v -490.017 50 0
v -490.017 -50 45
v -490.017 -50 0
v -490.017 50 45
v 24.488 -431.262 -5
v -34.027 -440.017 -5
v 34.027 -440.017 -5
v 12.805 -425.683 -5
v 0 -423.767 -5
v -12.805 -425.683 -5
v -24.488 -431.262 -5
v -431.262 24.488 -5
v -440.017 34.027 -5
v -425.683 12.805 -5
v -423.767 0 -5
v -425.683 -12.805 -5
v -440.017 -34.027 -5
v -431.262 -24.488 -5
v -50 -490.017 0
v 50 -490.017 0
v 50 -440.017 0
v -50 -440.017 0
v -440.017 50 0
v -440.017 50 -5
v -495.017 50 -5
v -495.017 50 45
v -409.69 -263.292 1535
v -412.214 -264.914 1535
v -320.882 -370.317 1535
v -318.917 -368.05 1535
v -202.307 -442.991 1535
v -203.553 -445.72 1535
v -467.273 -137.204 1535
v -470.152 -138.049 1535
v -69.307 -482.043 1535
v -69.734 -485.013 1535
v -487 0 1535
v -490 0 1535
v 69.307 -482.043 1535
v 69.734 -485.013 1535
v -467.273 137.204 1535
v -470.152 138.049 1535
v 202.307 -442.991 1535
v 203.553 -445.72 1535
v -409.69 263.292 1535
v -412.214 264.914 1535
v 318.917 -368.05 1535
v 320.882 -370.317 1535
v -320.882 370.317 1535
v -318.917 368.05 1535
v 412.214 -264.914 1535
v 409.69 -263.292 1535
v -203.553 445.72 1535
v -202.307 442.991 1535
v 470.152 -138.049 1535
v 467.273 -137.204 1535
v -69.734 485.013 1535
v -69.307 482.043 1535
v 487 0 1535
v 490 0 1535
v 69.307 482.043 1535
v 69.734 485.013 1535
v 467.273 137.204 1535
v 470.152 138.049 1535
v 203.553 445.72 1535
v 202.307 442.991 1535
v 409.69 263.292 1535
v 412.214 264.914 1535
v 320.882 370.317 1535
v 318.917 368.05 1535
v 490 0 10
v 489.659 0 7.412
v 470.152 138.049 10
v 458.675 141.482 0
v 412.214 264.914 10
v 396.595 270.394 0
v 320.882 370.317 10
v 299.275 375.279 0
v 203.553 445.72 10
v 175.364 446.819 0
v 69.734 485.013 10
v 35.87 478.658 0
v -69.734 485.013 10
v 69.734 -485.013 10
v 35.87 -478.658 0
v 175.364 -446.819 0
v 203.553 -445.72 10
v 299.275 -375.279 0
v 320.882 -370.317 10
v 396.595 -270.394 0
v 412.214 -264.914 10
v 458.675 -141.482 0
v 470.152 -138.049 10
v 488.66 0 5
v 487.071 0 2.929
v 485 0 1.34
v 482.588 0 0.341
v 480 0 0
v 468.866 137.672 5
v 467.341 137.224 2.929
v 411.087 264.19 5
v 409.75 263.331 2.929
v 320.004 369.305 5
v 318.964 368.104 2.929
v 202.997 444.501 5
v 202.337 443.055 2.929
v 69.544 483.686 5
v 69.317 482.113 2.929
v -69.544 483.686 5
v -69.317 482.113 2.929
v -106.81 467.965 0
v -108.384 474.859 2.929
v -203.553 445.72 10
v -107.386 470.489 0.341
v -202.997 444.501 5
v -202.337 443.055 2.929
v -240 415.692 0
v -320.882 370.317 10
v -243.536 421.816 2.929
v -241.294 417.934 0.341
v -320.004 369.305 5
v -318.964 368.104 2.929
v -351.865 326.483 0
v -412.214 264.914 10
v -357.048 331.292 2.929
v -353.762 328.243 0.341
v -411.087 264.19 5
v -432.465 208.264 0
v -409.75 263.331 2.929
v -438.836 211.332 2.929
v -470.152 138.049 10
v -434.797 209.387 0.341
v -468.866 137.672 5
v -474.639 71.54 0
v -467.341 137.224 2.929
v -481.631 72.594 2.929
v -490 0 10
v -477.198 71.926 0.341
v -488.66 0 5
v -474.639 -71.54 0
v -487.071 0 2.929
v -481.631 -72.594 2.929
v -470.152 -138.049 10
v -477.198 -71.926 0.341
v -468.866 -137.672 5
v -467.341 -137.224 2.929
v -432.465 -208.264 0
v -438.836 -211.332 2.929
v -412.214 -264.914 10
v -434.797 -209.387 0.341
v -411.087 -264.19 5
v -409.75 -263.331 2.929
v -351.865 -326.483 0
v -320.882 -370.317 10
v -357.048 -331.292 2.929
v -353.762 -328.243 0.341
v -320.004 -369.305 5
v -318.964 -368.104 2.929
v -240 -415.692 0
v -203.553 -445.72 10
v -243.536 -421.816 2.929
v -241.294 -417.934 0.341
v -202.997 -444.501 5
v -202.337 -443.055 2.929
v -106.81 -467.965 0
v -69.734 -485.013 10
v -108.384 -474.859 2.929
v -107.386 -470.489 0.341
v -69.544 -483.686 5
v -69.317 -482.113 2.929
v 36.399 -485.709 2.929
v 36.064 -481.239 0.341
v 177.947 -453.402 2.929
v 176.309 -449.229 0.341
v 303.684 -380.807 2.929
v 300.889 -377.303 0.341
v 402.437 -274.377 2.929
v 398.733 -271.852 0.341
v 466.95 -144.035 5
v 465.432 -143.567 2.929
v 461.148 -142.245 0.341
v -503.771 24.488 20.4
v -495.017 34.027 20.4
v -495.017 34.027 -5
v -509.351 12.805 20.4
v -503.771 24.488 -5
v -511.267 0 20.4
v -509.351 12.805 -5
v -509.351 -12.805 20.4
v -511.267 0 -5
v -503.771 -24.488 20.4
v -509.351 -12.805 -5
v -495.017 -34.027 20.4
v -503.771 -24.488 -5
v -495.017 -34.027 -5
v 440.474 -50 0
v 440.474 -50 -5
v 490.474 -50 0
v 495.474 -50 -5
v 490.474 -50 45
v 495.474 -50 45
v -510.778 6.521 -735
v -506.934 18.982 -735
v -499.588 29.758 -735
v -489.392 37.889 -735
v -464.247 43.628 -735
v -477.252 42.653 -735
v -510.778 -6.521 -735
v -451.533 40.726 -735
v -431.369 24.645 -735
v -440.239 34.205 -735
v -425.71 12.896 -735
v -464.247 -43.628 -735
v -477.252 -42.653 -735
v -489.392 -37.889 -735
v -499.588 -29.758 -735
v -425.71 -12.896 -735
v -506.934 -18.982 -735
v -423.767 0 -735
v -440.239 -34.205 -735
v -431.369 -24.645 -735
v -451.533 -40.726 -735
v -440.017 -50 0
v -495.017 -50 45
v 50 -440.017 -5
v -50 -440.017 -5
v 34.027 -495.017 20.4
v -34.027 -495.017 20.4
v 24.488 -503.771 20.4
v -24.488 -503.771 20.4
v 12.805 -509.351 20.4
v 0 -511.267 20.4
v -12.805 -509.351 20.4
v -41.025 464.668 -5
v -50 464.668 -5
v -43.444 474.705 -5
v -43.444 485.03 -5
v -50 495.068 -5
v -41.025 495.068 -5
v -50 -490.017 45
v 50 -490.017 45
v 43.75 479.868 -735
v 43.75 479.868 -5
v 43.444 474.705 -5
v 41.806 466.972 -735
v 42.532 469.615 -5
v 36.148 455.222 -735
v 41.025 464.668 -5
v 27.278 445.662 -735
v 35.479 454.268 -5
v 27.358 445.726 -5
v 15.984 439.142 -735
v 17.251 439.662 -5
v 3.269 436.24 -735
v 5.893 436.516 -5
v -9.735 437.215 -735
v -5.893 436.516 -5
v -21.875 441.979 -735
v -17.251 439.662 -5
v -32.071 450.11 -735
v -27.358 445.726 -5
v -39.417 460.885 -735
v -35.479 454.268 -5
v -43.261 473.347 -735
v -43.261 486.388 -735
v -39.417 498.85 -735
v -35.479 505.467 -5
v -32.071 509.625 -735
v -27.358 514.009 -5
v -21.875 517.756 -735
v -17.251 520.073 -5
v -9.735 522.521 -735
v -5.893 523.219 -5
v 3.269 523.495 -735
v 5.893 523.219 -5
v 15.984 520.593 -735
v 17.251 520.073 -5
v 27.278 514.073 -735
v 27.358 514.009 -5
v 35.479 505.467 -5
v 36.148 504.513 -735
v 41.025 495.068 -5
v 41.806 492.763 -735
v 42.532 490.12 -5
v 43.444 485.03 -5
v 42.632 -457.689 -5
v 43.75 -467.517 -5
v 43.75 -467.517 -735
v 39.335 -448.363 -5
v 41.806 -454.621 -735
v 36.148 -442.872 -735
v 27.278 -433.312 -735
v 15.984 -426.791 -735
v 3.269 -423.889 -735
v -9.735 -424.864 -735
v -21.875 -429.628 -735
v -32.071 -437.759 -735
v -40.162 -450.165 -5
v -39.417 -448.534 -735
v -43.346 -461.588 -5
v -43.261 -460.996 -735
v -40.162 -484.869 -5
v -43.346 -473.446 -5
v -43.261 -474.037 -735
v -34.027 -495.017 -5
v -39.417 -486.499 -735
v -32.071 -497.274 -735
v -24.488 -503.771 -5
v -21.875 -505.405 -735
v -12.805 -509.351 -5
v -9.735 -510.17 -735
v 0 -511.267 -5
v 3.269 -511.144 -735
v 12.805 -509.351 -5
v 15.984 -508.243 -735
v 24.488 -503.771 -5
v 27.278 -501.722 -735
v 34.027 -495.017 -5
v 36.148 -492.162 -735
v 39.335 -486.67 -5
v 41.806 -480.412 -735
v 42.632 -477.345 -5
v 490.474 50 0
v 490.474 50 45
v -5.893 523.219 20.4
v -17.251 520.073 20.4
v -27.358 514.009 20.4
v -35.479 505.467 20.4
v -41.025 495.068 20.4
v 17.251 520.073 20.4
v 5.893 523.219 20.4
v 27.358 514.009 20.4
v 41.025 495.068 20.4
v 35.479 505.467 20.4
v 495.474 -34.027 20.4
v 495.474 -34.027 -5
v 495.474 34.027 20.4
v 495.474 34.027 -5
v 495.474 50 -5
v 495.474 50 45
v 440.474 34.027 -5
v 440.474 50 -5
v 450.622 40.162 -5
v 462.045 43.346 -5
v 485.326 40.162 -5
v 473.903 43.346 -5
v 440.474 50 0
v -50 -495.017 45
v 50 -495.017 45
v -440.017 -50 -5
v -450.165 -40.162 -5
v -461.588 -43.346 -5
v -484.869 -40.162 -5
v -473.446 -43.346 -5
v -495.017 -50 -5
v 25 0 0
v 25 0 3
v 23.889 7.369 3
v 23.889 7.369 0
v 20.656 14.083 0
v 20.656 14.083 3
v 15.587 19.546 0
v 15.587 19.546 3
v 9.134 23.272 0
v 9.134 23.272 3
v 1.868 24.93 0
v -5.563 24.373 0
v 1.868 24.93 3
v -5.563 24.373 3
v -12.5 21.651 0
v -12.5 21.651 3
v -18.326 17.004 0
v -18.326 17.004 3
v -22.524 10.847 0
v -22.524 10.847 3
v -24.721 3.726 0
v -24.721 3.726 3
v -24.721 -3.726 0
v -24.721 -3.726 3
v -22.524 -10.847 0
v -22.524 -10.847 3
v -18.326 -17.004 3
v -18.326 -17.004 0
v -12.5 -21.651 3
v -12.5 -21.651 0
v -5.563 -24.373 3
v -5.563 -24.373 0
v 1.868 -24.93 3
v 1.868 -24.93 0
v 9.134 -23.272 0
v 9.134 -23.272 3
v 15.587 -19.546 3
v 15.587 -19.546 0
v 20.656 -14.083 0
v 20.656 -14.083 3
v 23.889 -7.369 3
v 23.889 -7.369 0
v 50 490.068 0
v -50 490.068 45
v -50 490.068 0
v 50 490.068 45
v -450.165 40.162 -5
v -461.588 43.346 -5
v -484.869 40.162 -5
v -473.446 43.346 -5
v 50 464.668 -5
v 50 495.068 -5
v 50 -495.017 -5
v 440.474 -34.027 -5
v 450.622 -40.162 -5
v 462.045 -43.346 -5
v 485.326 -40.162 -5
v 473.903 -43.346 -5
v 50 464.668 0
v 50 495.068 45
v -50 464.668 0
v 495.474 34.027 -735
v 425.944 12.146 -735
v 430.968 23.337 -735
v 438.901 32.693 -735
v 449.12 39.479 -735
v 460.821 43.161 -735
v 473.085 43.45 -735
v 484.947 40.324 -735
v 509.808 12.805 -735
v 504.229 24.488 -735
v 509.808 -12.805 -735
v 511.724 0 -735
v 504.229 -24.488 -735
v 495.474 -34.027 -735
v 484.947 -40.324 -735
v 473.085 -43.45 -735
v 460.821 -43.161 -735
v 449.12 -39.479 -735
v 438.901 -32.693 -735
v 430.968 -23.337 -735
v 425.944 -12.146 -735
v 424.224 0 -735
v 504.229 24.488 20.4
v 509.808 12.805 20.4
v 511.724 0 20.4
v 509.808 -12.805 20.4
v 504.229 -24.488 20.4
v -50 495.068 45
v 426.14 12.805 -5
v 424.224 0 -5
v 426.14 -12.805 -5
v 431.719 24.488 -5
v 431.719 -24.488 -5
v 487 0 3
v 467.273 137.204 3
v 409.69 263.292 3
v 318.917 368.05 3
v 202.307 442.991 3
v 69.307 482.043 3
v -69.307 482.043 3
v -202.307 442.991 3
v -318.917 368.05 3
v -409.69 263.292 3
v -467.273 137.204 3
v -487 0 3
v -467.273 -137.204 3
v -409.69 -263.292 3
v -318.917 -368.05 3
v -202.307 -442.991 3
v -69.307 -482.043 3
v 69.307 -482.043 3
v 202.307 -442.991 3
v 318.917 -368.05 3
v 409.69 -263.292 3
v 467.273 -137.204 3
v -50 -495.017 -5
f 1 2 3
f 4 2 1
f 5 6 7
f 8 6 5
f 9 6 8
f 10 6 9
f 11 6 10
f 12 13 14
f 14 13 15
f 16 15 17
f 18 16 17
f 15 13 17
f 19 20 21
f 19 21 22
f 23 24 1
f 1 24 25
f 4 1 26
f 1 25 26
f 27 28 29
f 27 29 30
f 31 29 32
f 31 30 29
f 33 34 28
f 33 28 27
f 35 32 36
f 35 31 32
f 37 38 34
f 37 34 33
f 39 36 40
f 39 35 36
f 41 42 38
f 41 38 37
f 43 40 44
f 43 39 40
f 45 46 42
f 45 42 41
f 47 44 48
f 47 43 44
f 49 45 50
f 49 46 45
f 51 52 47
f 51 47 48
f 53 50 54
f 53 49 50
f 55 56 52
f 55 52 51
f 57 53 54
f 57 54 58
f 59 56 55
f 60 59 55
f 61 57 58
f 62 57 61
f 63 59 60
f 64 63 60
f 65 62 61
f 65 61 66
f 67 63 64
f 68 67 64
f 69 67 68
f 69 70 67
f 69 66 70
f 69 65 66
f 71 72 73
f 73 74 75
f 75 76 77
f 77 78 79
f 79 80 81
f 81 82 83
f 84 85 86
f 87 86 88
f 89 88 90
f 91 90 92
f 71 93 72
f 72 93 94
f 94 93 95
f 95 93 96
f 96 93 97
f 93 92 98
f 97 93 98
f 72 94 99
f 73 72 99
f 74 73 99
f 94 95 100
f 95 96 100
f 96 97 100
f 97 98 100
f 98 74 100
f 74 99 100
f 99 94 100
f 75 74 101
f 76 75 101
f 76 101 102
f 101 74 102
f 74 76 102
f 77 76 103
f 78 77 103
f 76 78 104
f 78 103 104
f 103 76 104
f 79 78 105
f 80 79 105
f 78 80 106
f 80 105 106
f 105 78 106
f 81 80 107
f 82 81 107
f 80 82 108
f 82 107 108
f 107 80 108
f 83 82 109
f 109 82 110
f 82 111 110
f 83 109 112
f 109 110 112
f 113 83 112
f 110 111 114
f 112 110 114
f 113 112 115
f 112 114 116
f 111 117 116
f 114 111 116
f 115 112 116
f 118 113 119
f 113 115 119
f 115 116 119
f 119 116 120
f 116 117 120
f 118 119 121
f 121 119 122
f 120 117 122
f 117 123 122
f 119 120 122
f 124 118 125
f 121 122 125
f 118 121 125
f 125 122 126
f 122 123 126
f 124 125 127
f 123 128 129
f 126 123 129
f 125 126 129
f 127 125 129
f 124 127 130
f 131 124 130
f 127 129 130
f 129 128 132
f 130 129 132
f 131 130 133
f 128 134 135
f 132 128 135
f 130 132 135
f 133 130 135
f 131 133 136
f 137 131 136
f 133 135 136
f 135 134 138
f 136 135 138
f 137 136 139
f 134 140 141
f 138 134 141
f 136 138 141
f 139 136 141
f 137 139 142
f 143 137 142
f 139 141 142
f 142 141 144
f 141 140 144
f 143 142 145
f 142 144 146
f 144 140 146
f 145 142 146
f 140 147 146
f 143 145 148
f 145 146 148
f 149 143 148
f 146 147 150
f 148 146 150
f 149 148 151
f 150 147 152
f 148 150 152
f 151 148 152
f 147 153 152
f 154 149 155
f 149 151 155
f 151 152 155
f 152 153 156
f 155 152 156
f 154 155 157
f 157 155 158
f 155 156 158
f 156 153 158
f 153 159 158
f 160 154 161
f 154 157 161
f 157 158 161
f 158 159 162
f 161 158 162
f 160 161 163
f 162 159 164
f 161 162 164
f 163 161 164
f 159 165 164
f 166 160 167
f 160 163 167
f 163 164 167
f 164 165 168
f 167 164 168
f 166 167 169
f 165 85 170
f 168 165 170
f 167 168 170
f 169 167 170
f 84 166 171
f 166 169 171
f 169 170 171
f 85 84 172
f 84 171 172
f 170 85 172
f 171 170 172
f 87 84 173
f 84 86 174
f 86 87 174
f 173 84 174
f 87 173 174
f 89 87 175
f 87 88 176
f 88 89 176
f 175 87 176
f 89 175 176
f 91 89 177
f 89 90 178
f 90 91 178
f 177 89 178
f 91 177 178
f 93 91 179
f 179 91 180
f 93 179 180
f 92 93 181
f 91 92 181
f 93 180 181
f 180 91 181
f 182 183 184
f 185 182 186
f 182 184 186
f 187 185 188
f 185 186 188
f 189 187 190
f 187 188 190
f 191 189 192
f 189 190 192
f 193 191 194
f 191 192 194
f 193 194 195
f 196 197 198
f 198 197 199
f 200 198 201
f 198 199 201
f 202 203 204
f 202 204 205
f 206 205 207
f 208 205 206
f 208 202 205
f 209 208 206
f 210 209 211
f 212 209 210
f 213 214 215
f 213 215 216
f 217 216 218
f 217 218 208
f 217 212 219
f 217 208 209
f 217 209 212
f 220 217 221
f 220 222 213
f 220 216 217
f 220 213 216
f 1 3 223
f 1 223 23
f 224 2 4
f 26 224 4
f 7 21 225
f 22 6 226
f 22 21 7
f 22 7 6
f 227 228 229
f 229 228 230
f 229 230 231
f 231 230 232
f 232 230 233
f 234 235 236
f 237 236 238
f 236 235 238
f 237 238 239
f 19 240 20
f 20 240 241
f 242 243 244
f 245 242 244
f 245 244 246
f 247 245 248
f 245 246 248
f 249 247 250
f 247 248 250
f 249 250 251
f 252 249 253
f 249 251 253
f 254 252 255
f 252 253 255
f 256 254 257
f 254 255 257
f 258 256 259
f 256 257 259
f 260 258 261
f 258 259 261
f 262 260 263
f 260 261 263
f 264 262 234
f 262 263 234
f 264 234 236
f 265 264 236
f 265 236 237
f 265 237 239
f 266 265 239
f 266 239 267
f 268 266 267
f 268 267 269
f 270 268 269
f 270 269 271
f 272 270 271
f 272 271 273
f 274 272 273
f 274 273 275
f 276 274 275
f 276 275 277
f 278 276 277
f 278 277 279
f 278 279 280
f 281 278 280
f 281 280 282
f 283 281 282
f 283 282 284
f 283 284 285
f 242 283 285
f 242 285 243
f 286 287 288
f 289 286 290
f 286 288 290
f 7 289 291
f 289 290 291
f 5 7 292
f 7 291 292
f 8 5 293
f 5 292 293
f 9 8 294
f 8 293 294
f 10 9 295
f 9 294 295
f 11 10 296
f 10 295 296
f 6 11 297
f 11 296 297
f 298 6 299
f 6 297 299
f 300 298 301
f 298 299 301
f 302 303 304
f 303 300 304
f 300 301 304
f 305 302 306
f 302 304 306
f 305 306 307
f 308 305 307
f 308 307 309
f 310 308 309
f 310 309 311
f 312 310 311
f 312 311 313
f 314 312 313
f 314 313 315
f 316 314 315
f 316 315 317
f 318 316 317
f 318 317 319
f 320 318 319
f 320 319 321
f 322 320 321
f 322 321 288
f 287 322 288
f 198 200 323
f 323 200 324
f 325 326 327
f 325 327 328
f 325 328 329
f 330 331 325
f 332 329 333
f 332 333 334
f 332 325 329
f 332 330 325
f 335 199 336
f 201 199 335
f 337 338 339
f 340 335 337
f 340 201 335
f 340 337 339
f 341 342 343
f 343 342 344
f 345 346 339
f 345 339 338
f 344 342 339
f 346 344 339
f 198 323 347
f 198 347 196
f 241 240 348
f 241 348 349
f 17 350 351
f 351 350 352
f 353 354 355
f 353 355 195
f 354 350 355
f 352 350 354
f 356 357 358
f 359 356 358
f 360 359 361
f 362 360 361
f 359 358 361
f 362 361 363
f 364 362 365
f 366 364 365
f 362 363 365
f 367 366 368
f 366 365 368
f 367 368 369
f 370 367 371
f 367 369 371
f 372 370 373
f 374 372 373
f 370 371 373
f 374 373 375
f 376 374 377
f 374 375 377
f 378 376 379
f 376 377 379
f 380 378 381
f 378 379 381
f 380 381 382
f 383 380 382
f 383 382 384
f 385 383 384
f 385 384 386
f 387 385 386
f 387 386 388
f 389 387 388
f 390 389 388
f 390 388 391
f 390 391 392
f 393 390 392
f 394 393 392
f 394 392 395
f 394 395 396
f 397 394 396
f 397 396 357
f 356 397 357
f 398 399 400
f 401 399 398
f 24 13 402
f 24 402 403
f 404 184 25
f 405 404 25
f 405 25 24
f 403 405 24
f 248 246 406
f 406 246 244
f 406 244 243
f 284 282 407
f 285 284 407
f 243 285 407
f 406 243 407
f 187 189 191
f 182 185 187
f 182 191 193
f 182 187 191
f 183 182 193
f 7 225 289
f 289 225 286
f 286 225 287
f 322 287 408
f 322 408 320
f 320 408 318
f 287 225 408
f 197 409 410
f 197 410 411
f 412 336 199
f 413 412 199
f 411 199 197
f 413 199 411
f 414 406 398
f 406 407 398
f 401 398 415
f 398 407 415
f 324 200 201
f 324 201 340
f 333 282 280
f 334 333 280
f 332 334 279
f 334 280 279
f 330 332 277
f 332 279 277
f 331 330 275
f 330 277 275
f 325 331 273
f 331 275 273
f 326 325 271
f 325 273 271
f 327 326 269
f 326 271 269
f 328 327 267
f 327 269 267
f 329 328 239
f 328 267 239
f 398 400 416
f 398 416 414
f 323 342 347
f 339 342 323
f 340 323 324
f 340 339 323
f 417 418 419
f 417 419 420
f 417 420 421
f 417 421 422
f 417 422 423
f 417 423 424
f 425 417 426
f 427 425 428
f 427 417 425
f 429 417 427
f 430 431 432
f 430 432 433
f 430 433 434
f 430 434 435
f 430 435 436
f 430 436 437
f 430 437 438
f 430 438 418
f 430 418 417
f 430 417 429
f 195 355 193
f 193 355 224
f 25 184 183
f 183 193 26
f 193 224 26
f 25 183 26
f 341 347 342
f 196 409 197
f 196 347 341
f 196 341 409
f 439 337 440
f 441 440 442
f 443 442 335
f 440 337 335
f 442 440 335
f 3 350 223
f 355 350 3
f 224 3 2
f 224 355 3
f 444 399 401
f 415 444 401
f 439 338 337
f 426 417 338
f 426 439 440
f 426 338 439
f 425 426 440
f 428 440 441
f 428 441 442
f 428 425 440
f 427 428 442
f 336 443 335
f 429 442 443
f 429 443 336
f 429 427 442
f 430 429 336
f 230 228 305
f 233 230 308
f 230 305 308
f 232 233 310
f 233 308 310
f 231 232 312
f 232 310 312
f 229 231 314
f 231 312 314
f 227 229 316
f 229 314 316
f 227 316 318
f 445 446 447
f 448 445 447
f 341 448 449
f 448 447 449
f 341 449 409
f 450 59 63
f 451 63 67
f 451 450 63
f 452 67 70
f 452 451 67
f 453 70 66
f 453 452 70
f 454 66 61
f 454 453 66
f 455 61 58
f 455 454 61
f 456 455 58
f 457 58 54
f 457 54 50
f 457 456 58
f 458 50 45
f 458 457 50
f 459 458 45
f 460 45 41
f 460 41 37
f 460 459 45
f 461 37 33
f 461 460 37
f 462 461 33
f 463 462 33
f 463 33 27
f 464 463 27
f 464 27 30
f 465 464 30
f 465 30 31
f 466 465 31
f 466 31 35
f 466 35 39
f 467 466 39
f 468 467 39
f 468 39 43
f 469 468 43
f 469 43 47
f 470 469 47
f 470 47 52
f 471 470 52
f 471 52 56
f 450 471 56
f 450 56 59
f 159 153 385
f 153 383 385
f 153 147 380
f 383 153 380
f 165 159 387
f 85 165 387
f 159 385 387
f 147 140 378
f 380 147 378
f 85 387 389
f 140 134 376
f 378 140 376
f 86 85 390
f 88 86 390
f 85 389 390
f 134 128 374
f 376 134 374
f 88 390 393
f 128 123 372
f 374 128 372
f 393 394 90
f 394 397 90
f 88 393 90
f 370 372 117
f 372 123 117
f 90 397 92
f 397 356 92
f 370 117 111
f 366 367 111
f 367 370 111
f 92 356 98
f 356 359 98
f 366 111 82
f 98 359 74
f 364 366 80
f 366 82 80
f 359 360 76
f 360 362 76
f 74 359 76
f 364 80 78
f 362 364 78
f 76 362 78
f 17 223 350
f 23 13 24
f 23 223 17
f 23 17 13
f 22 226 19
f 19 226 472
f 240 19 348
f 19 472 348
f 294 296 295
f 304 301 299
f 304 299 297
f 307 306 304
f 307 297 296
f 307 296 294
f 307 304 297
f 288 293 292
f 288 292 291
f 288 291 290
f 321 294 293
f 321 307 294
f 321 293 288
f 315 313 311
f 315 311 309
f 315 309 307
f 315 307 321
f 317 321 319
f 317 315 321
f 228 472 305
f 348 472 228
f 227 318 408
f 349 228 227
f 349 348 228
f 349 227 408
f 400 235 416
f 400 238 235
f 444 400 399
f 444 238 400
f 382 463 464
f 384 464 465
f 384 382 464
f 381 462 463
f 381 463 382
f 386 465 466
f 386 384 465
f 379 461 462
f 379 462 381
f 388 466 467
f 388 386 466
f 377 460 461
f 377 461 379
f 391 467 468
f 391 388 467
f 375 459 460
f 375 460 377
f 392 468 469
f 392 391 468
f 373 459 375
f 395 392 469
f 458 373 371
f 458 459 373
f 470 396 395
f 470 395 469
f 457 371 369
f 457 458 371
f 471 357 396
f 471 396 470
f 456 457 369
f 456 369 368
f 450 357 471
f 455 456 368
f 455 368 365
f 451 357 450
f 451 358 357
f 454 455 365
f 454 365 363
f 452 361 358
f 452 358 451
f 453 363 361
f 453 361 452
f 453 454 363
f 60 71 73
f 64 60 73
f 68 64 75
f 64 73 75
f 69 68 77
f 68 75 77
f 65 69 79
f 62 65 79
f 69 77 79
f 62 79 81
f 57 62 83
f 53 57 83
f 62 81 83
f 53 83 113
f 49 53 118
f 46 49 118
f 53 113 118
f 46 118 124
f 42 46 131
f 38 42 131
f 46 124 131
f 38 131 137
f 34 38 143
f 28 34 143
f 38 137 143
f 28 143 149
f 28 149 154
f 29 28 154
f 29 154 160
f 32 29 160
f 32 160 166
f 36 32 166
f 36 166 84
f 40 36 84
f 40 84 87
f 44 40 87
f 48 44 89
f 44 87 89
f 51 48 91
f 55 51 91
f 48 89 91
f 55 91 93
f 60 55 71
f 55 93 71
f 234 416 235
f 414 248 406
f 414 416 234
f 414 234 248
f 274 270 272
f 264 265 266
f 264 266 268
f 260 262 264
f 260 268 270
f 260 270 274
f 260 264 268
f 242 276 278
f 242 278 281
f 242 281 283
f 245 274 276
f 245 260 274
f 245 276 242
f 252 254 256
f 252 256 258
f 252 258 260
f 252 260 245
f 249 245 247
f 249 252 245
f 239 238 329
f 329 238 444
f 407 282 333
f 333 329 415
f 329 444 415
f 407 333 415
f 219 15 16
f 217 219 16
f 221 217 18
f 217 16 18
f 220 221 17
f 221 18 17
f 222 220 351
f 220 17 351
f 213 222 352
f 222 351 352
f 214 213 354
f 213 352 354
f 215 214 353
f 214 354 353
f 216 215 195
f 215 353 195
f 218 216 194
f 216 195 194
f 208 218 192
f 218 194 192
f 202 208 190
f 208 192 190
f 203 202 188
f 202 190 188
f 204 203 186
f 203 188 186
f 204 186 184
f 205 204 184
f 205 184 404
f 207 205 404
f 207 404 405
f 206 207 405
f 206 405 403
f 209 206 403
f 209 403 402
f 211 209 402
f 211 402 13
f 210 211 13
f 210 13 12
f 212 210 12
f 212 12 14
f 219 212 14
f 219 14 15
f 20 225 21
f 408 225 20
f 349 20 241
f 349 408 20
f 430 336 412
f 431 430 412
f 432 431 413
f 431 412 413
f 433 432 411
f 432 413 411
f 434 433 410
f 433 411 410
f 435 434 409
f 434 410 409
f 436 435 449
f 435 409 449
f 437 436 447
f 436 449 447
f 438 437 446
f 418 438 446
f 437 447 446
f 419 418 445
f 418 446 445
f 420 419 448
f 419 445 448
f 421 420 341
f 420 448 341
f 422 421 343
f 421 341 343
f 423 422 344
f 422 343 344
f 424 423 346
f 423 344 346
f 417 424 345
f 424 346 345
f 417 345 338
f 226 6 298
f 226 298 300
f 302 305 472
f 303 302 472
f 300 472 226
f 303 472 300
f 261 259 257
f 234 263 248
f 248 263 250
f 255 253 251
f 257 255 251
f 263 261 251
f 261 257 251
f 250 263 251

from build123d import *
from build123d import SkipClean  # not in build123d's __all__

# Parameters (mm, degrees)
F0_R           = 490
F1_DEPTH       = 1535
F2_T           = -3
F3_R           = 10
F5_W           = 100
F5_H           = 50
F6_DEPTH       = 5
F7_W           = 100
F7_H           = 5
F8_DEPTH       = 50
F10_W          = 100
F10_H          = 50
F11_DEPTH      = 5
F12_W          = 100
F12_H          = 5
F13_DEPTH      = 50
F15_W          = 100
F15_H          = 50
F16_DEPTH      = 5
F17_W          = 100
F17_H          = 5
F18_DEPTH      = 50
F20_W          = 100
F20_H          = 50
F21_DEPTH      = 5
F22_W          = 100
F22_H          = 5
F23_DEPTH      = 25.4
F25_DEPTH      = 730
F25_DEPTH_BACK = 25.4
F24_R          = 43.75
F26_DEPTH      = 730
F27_R          = 43.75
F28_DEPTH      = 730
F30_DEPTH      = 25.4
F31_R          = 43.75
F32_DEPTH      = 730
F34_DEPTH      = 25.4
F35_R          = 43.75
F36_DEPTH      = 730
F38_DEPTH      = 25.4
F39_R          = 25
F40_DEPTH      = 25.4


with BuildPart() as f1:
    # F0 (on Top) → F1 (new body)
    with BuildSketch(Plane.XY):
        Circle(F0_R)
    extrude(amount=F1_DEPTH)

    # F2
    f2_openings = [f1.faces().sort_by_distance(p)[0] for p in [
        (0, 0, 1535),
    ]]
    offset(amount=F2_T, openings=f2_openings)

    # F3
    f3_edges = [f1.edges().sort_by_distance(p)[0] for p in [
        (-490, 0, 0),
    ]]
    fillet(f3_edges, radius=F3_R)

    # F39 (on face) → F40 (cut)
    with BuildSketch(Plane.XY.offset(3)):
        Circle(F39_R)
    extrude(amount=-F40_DEPTH, mode=Mode.SUBTRACT)


with BuildPart() as f6:
    # F5 (on offset) → F6 (new body)
    with BuildSketch(Plane.XZ.offset(490.0168)):
        with Locations((0, 20)):
            Rectangle(F5_W, F5_H)
    extrude(amount=F6_DEPTH)

    # F7 (on face) → F8 (join)
    with BuildSketch(Plane(origin=(0, -490.0168, 0), x_dir=(-1, 0, 0), z_dir=(0, 1, 0))):
        with Locations((0, -2.5)):
            Rectangle(F7_W, F7_H)
    extrude(amount=F8_DEPTH)

    # F27 (on face) → F28 (join)
    with BuildSketch(Plane(origin=(0, 0, -5), x_dir=(1, 0, 0), z_dir=(0, 0, -1))):
        with Locations((0, 467.5168)):
            Circle(F27_R)
    extrude(amount=F28_DEPTH)

    # F29 (on face) → F30 (join)
    with BuildSketch(Plane.XY.offset(-5)):
        with BuildLine():
            Line((34.026643972, -495.0168), (-34.026643972, -495.0168))
            ThreePointArc((-34.026643972, -495.0168), (0, -511.2668), (34.026643972, -495.0168))
        make_face()
    extrude(amount=F30_DEPTH)


with BuildPart() as f11:
    # F10 (on offset) → F11 (new body)
    with BuildSketch(Plane.YZ.offset(490.474)):
        with Locations((0, 20)):
            Rectangle(F10_W, F10_H)
    extrude(amount=F11_DEPTH)

    # F12 (on face) → F13 (join)
    with BuildSketch(Plane(origin=(490.474, 0, 0), x_dir=(0, -1, 0), z_dir=(-1, 0, 0))):
        with Locations((0, -2.5)):
            Rectangle(F12_W, F12_H)
    extrude(amount=F13_DEPTH)

    # F24 (on face) → F25 (join, two sides)
    with BuildSketch(Plane(origin=(0, 0, -5), x_dir=(1, 0, 0), z_dir=(0, 0, -1))) as f25_sk:
        with BuildLine():
            ThreePointArc((495.474, -34.026643972), (507.4530292434, -18.8538789112), (511.724, 0))
            ThreePointArc((511.724, 0), (507.4530292434, 18.8538789112), (495.474, 34.026643972))
            Line((495.474, 34.026643972), (495.474, -34.026643972))
        make_face()
    extrude(amount=F25_DEPTH)
    extrude(f25_sk.sketch, amount=-F25_DEPTH_BACK)

    # F24 (on face) → F26 (join)
    with BuildSketch(Plane(origin=(0, 0, -5), x_dir=(1, 0, 0), z_dir=(0, 0, -1))):
        with Locations((467.974, 0)):
            Circle(F24_R)
    extrude(amount=F26_DEPTH)


with BuildPart() as f16:
    # F15 (on offset) → F16 (new body)
    with BuildSketch(Plane.YZ.offset(-490.0168)):
        with Locations((0, 20)):
            Rectangle(F15_W, F15_H)
    extrude(amount=-F16_DEPTH)

    # F17 (on face) → F18 (join)
    with BuildSketch(Plane.YZ.offset(-490.0168)):
        with Locations((0, -2.5)):
            Rectangle(F17_W, F17_H)
    extrude(amount=F18_DEPTH)

    # F31 (on face) → F32 (join)
    with BuildSketch(Plane(origin=(0, 0, -5), x_dir=(1, 0, 0), z_dir=(0, 0, -1))):
        with Locations((-467.5168, 0)):
            Circle(F31_R)
    extrude(amount=F32_DEPTH)

    # F33 (on face) → F34 (join)
    with BuildSketch(Plane.XY.offset(-5)):
        with BuildLine():
            Line((-495.0168, -34.026643972), (-495.0168, 34.026643972))
            ThreePointArc((-495.0168, 34.026643972), (-511.2668, 0), (-495.0168, -34.026643972))
        make_face()
    with SkipClean():  # cleaning this boolean's faces spoils the solid; the shape is the same uncleaned
        extrude(amount=F34_DEPTH)


with BuildPart() as f21:
    # F20 (on offset) → F21 (new body)
    with BuildSketch(Plane.XZ.offset(-490.0676)):
        with Locations((0, 20)):
            Rectangle(F20_W, F20_H)
    extrude(amount=-F21_DEPTH)

    # F22 (on face) → F23 (join)
    with BuildSketch(Plane.XZ.offset(-490.0676)):
        with Locations((0, -2.5)):
            Rectangle(F22_W, F22_H)
    extrude(amount=F23_DEPTH)

    # F35 (on face) → F36 (join)
    with BuildSketch(Plane(origin=(0, 0, -5), x_dir=(1, 0, 0), z_dir=(0, 0, -1))):
        with Locations((0, -479.8676)):
            Circle(F35_R)
    extrude(amount=F36_DEPTH)

    # F37 (on face) → F38 (join)
    with BuildSketch(Plane.XY.offset(-5)):
        with BuildLine():
            Line((-41.0246572198, 495.0676), (41.0246572198, 495.0676))
            ThreePointArc((41.0246572198, 495.0676), (0, 523.6176), (-41.0246572198, 495.0676))
        make_face()
    extrude(amount=F38_DEPTH)


solid = Compound([f1.part, f6.part, f11.part, f16.part, f21.part])
